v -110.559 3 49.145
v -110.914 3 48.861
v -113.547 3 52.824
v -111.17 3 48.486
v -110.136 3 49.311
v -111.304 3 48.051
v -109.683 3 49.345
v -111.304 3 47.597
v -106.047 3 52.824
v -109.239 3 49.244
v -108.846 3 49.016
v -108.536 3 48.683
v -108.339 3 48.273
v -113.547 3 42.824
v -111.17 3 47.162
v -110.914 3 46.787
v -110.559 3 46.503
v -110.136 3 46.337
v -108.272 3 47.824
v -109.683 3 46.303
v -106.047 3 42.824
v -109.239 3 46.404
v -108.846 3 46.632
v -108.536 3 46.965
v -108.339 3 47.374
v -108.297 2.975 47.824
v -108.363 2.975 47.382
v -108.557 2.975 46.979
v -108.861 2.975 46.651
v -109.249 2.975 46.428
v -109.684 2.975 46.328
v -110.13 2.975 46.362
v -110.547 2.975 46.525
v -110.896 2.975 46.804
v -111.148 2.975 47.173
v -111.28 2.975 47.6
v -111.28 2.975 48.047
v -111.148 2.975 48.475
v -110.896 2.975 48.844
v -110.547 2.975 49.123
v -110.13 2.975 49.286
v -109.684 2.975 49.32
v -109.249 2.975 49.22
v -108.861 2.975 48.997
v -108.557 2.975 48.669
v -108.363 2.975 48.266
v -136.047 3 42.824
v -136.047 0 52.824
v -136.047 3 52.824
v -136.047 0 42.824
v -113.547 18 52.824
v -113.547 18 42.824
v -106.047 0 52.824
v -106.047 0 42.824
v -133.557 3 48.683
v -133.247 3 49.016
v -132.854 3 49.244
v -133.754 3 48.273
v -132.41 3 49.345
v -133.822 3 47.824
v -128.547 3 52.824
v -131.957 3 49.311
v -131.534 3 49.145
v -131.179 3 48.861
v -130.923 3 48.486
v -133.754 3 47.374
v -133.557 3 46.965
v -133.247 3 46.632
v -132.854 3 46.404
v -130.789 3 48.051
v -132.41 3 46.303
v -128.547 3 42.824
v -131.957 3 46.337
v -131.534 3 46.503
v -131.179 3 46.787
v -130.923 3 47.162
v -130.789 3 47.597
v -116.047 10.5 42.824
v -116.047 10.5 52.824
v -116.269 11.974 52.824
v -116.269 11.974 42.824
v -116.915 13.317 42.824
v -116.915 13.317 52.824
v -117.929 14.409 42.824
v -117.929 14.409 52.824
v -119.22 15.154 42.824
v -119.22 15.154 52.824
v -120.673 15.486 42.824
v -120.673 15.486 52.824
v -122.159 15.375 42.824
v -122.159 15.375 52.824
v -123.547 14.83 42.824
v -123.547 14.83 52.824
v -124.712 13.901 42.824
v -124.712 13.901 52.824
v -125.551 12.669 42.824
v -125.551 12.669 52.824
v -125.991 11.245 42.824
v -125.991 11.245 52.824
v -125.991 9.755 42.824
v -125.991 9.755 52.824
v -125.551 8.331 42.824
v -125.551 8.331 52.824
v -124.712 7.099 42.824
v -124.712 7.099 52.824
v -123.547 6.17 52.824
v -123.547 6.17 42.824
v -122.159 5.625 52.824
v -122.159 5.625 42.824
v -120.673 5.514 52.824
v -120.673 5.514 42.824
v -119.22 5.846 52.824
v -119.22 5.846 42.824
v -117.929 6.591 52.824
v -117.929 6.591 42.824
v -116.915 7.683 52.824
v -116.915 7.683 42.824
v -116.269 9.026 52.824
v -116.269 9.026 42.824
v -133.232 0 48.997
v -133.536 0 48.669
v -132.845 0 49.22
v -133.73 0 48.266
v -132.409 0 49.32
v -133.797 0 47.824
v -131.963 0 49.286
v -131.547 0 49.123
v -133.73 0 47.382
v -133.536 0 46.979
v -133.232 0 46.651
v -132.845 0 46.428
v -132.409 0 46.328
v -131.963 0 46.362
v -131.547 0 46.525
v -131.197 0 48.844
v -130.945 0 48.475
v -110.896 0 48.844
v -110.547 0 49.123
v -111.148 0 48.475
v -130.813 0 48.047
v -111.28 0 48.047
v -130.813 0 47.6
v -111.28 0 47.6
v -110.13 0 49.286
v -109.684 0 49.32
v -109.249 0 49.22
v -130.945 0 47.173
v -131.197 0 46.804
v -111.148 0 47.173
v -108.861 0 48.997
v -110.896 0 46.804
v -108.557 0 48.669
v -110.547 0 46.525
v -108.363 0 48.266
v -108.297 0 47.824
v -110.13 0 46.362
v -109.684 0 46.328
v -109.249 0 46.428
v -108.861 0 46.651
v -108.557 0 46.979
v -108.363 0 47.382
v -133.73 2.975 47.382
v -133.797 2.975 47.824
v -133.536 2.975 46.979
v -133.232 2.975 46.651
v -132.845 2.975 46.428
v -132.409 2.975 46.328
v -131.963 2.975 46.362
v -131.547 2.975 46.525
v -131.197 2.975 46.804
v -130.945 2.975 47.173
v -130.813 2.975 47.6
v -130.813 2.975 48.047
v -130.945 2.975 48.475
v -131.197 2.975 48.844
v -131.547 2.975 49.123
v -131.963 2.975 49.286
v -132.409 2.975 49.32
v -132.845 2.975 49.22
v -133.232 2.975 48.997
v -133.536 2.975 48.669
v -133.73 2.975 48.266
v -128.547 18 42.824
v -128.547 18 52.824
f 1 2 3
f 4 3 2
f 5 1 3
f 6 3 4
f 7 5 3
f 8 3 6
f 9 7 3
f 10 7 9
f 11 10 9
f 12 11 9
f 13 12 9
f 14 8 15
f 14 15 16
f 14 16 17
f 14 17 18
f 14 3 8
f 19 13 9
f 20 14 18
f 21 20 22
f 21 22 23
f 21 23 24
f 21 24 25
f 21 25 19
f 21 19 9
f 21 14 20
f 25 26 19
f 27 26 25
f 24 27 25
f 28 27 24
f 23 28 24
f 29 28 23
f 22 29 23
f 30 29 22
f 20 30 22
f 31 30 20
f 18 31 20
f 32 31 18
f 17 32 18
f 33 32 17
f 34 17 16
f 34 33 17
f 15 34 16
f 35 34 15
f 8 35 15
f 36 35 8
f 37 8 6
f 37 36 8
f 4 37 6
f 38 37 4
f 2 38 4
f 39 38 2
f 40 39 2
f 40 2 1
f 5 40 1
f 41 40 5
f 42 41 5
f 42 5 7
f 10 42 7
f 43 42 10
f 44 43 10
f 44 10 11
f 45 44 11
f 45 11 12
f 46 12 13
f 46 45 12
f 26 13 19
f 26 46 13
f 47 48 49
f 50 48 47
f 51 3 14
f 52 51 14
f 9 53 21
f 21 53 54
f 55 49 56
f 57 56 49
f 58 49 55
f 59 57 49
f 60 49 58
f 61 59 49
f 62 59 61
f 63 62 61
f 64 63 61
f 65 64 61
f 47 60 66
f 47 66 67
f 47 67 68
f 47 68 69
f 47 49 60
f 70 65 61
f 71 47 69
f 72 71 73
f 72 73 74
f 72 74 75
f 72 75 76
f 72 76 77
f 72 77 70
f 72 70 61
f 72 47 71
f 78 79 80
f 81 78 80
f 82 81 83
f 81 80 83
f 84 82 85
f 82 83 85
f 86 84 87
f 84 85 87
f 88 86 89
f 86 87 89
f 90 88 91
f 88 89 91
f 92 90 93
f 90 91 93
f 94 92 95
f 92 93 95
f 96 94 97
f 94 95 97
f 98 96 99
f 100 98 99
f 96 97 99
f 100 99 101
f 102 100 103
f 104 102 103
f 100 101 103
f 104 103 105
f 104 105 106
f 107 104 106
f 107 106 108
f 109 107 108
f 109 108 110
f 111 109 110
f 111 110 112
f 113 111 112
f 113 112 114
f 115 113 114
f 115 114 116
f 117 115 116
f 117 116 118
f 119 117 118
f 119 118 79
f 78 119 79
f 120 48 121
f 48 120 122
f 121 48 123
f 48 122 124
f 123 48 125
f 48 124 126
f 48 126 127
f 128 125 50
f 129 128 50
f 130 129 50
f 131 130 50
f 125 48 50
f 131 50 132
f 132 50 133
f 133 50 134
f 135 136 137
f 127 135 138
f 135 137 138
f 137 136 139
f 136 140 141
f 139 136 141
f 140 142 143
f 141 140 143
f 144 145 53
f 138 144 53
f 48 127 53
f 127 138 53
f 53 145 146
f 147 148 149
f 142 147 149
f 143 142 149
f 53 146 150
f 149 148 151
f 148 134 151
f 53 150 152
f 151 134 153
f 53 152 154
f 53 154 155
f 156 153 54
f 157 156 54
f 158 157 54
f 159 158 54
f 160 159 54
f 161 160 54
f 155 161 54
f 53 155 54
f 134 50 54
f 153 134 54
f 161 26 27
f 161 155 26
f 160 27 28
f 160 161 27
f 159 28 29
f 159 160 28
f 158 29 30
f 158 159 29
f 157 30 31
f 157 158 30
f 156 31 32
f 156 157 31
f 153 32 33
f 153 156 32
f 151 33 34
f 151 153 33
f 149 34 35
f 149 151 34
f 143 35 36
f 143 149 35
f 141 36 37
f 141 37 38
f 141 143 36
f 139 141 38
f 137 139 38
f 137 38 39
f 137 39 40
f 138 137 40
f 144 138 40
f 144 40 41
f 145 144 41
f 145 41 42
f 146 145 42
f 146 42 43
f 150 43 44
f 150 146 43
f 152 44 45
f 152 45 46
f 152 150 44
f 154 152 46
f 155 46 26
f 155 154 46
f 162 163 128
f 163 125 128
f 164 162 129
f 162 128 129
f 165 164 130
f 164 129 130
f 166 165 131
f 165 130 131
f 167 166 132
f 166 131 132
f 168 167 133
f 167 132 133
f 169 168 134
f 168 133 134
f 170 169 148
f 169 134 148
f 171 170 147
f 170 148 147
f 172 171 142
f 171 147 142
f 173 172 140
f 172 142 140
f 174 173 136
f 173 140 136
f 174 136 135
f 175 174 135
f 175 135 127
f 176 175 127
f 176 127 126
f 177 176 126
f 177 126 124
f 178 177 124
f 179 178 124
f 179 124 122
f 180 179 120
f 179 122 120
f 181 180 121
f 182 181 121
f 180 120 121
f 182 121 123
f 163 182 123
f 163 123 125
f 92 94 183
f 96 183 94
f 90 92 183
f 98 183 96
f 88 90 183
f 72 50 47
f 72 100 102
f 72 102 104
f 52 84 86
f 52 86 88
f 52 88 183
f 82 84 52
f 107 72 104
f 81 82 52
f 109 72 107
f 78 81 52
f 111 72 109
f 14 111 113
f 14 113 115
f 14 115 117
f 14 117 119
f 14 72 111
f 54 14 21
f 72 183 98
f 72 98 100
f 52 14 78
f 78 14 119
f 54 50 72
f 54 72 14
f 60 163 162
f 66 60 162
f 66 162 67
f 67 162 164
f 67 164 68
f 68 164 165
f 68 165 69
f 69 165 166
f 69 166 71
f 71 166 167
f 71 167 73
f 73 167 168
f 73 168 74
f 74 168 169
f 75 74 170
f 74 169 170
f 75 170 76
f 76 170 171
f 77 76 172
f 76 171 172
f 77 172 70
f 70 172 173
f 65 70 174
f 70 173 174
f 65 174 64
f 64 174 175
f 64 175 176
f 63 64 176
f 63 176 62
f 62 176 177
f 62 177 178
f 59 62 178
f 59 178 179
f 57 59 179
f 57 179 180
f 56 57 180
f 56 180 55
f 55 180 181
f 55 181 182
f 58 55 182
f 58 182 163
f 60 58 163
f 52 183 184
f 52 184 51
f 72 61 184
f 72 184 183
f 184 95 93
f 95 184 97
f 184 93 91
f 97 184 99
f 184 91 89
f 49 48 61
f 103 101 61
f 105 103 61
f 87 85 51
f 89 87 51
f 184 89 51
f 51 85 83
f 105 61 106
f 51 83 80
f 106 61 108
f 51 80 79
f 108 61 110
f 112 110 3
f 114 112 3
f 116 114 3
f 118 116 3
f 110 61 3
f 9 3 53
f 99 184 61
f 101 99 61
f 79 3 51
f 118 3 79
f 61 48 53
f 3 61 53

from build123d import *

# Parameters (mm, degrees)
SKETCH1_W                       = 30
SKETCH1_H                       = 10
BOSS_EXTRUDE1_DEPTH             = 3
SKETCH2_W                       = 15
SKETCH2_H                       = 10
BOSS_EXTRUDE2_DEPTH             = 15
SKETCH3_R                       = 5
CUT_EXTRUDE1_DEPTH              = 138.595978597
F_3_0MM_DOWEL_HOLE1_D           = 3
F_3_0MM_DOWEL_HOLE1_CSINK_D     = 3.05
F_3_0MM_DOWEL_HOLE1_CSINK_ANGLE = 90


with BuildPart() as part:
    # Sketch1 → Boss-Extrude1 (new body)
    with BuildSketch(Plane(origin=(0, 0, 0), x_dir=(1, 0, 0), z_dir=(0, 1, 0))):
        with Locations((-121.046511628, -47.823920266)):
            Rectangle(SKETCH1_W, SKETCH1_H)
    extrude(amount=BOSS_EXTRUDE1_DEPTH)

    # Sketch2 → Boss-Extrude2 (add)
    with BuildSketch(Plane(origin=(0, 3, 0), x_dir=(1, 0, 0), z_dir=(0, 1, 0))):
        with Locations((-121.046511628, -47.823920266)):
            Rectangle(SKETCH2_W, SKETCH2_H)
    extrude(amount=BOSS_EXTRUDE2_DEPTH)

    # Sketch3 → Cut-Extrude1 (cut, through all)
    with BuildSketch(Plane.XY.offset(52.823920266)):
        with Locations((-121.046511628, 10.5)):
            Circle(SKETCH3_R)
    extrude(amount=-CUT_EXTRUDE1_DEPTH, mode=Mode.SUBTRACT)

    # Ø3.0mm Dowel Hole1 (through all)
    with Locations(Plane(origin=(0, 3, 0), x_dir=(1, 0, 0), z_dir=(0, 1, 0))):
        with Locations((-132.296511628, -47.823920266)):
            f_3_0mm_dowel_hole1 = CounterSinkHole(F_3_0MM_DOWEL_HOLE1_D / 2, F_3_0MM_DOWEL_HOLE1_CSINK_D / 2, counter_sink_angle=F_3_0MM_DOWEL_HOLE1_CSINK_ANGLE)

    # Mirror1: Ø3.0mm Dowel Hole1 across plane
    add(f_3_0mm_dowel_hole1.mirror(Plane(origin=(-121.046511628, 0, 0), x_dir=(0, 0, 1), z_dir=(1, 0, 0))), mode=Mode.SUBTRACT)


solid = part.part
